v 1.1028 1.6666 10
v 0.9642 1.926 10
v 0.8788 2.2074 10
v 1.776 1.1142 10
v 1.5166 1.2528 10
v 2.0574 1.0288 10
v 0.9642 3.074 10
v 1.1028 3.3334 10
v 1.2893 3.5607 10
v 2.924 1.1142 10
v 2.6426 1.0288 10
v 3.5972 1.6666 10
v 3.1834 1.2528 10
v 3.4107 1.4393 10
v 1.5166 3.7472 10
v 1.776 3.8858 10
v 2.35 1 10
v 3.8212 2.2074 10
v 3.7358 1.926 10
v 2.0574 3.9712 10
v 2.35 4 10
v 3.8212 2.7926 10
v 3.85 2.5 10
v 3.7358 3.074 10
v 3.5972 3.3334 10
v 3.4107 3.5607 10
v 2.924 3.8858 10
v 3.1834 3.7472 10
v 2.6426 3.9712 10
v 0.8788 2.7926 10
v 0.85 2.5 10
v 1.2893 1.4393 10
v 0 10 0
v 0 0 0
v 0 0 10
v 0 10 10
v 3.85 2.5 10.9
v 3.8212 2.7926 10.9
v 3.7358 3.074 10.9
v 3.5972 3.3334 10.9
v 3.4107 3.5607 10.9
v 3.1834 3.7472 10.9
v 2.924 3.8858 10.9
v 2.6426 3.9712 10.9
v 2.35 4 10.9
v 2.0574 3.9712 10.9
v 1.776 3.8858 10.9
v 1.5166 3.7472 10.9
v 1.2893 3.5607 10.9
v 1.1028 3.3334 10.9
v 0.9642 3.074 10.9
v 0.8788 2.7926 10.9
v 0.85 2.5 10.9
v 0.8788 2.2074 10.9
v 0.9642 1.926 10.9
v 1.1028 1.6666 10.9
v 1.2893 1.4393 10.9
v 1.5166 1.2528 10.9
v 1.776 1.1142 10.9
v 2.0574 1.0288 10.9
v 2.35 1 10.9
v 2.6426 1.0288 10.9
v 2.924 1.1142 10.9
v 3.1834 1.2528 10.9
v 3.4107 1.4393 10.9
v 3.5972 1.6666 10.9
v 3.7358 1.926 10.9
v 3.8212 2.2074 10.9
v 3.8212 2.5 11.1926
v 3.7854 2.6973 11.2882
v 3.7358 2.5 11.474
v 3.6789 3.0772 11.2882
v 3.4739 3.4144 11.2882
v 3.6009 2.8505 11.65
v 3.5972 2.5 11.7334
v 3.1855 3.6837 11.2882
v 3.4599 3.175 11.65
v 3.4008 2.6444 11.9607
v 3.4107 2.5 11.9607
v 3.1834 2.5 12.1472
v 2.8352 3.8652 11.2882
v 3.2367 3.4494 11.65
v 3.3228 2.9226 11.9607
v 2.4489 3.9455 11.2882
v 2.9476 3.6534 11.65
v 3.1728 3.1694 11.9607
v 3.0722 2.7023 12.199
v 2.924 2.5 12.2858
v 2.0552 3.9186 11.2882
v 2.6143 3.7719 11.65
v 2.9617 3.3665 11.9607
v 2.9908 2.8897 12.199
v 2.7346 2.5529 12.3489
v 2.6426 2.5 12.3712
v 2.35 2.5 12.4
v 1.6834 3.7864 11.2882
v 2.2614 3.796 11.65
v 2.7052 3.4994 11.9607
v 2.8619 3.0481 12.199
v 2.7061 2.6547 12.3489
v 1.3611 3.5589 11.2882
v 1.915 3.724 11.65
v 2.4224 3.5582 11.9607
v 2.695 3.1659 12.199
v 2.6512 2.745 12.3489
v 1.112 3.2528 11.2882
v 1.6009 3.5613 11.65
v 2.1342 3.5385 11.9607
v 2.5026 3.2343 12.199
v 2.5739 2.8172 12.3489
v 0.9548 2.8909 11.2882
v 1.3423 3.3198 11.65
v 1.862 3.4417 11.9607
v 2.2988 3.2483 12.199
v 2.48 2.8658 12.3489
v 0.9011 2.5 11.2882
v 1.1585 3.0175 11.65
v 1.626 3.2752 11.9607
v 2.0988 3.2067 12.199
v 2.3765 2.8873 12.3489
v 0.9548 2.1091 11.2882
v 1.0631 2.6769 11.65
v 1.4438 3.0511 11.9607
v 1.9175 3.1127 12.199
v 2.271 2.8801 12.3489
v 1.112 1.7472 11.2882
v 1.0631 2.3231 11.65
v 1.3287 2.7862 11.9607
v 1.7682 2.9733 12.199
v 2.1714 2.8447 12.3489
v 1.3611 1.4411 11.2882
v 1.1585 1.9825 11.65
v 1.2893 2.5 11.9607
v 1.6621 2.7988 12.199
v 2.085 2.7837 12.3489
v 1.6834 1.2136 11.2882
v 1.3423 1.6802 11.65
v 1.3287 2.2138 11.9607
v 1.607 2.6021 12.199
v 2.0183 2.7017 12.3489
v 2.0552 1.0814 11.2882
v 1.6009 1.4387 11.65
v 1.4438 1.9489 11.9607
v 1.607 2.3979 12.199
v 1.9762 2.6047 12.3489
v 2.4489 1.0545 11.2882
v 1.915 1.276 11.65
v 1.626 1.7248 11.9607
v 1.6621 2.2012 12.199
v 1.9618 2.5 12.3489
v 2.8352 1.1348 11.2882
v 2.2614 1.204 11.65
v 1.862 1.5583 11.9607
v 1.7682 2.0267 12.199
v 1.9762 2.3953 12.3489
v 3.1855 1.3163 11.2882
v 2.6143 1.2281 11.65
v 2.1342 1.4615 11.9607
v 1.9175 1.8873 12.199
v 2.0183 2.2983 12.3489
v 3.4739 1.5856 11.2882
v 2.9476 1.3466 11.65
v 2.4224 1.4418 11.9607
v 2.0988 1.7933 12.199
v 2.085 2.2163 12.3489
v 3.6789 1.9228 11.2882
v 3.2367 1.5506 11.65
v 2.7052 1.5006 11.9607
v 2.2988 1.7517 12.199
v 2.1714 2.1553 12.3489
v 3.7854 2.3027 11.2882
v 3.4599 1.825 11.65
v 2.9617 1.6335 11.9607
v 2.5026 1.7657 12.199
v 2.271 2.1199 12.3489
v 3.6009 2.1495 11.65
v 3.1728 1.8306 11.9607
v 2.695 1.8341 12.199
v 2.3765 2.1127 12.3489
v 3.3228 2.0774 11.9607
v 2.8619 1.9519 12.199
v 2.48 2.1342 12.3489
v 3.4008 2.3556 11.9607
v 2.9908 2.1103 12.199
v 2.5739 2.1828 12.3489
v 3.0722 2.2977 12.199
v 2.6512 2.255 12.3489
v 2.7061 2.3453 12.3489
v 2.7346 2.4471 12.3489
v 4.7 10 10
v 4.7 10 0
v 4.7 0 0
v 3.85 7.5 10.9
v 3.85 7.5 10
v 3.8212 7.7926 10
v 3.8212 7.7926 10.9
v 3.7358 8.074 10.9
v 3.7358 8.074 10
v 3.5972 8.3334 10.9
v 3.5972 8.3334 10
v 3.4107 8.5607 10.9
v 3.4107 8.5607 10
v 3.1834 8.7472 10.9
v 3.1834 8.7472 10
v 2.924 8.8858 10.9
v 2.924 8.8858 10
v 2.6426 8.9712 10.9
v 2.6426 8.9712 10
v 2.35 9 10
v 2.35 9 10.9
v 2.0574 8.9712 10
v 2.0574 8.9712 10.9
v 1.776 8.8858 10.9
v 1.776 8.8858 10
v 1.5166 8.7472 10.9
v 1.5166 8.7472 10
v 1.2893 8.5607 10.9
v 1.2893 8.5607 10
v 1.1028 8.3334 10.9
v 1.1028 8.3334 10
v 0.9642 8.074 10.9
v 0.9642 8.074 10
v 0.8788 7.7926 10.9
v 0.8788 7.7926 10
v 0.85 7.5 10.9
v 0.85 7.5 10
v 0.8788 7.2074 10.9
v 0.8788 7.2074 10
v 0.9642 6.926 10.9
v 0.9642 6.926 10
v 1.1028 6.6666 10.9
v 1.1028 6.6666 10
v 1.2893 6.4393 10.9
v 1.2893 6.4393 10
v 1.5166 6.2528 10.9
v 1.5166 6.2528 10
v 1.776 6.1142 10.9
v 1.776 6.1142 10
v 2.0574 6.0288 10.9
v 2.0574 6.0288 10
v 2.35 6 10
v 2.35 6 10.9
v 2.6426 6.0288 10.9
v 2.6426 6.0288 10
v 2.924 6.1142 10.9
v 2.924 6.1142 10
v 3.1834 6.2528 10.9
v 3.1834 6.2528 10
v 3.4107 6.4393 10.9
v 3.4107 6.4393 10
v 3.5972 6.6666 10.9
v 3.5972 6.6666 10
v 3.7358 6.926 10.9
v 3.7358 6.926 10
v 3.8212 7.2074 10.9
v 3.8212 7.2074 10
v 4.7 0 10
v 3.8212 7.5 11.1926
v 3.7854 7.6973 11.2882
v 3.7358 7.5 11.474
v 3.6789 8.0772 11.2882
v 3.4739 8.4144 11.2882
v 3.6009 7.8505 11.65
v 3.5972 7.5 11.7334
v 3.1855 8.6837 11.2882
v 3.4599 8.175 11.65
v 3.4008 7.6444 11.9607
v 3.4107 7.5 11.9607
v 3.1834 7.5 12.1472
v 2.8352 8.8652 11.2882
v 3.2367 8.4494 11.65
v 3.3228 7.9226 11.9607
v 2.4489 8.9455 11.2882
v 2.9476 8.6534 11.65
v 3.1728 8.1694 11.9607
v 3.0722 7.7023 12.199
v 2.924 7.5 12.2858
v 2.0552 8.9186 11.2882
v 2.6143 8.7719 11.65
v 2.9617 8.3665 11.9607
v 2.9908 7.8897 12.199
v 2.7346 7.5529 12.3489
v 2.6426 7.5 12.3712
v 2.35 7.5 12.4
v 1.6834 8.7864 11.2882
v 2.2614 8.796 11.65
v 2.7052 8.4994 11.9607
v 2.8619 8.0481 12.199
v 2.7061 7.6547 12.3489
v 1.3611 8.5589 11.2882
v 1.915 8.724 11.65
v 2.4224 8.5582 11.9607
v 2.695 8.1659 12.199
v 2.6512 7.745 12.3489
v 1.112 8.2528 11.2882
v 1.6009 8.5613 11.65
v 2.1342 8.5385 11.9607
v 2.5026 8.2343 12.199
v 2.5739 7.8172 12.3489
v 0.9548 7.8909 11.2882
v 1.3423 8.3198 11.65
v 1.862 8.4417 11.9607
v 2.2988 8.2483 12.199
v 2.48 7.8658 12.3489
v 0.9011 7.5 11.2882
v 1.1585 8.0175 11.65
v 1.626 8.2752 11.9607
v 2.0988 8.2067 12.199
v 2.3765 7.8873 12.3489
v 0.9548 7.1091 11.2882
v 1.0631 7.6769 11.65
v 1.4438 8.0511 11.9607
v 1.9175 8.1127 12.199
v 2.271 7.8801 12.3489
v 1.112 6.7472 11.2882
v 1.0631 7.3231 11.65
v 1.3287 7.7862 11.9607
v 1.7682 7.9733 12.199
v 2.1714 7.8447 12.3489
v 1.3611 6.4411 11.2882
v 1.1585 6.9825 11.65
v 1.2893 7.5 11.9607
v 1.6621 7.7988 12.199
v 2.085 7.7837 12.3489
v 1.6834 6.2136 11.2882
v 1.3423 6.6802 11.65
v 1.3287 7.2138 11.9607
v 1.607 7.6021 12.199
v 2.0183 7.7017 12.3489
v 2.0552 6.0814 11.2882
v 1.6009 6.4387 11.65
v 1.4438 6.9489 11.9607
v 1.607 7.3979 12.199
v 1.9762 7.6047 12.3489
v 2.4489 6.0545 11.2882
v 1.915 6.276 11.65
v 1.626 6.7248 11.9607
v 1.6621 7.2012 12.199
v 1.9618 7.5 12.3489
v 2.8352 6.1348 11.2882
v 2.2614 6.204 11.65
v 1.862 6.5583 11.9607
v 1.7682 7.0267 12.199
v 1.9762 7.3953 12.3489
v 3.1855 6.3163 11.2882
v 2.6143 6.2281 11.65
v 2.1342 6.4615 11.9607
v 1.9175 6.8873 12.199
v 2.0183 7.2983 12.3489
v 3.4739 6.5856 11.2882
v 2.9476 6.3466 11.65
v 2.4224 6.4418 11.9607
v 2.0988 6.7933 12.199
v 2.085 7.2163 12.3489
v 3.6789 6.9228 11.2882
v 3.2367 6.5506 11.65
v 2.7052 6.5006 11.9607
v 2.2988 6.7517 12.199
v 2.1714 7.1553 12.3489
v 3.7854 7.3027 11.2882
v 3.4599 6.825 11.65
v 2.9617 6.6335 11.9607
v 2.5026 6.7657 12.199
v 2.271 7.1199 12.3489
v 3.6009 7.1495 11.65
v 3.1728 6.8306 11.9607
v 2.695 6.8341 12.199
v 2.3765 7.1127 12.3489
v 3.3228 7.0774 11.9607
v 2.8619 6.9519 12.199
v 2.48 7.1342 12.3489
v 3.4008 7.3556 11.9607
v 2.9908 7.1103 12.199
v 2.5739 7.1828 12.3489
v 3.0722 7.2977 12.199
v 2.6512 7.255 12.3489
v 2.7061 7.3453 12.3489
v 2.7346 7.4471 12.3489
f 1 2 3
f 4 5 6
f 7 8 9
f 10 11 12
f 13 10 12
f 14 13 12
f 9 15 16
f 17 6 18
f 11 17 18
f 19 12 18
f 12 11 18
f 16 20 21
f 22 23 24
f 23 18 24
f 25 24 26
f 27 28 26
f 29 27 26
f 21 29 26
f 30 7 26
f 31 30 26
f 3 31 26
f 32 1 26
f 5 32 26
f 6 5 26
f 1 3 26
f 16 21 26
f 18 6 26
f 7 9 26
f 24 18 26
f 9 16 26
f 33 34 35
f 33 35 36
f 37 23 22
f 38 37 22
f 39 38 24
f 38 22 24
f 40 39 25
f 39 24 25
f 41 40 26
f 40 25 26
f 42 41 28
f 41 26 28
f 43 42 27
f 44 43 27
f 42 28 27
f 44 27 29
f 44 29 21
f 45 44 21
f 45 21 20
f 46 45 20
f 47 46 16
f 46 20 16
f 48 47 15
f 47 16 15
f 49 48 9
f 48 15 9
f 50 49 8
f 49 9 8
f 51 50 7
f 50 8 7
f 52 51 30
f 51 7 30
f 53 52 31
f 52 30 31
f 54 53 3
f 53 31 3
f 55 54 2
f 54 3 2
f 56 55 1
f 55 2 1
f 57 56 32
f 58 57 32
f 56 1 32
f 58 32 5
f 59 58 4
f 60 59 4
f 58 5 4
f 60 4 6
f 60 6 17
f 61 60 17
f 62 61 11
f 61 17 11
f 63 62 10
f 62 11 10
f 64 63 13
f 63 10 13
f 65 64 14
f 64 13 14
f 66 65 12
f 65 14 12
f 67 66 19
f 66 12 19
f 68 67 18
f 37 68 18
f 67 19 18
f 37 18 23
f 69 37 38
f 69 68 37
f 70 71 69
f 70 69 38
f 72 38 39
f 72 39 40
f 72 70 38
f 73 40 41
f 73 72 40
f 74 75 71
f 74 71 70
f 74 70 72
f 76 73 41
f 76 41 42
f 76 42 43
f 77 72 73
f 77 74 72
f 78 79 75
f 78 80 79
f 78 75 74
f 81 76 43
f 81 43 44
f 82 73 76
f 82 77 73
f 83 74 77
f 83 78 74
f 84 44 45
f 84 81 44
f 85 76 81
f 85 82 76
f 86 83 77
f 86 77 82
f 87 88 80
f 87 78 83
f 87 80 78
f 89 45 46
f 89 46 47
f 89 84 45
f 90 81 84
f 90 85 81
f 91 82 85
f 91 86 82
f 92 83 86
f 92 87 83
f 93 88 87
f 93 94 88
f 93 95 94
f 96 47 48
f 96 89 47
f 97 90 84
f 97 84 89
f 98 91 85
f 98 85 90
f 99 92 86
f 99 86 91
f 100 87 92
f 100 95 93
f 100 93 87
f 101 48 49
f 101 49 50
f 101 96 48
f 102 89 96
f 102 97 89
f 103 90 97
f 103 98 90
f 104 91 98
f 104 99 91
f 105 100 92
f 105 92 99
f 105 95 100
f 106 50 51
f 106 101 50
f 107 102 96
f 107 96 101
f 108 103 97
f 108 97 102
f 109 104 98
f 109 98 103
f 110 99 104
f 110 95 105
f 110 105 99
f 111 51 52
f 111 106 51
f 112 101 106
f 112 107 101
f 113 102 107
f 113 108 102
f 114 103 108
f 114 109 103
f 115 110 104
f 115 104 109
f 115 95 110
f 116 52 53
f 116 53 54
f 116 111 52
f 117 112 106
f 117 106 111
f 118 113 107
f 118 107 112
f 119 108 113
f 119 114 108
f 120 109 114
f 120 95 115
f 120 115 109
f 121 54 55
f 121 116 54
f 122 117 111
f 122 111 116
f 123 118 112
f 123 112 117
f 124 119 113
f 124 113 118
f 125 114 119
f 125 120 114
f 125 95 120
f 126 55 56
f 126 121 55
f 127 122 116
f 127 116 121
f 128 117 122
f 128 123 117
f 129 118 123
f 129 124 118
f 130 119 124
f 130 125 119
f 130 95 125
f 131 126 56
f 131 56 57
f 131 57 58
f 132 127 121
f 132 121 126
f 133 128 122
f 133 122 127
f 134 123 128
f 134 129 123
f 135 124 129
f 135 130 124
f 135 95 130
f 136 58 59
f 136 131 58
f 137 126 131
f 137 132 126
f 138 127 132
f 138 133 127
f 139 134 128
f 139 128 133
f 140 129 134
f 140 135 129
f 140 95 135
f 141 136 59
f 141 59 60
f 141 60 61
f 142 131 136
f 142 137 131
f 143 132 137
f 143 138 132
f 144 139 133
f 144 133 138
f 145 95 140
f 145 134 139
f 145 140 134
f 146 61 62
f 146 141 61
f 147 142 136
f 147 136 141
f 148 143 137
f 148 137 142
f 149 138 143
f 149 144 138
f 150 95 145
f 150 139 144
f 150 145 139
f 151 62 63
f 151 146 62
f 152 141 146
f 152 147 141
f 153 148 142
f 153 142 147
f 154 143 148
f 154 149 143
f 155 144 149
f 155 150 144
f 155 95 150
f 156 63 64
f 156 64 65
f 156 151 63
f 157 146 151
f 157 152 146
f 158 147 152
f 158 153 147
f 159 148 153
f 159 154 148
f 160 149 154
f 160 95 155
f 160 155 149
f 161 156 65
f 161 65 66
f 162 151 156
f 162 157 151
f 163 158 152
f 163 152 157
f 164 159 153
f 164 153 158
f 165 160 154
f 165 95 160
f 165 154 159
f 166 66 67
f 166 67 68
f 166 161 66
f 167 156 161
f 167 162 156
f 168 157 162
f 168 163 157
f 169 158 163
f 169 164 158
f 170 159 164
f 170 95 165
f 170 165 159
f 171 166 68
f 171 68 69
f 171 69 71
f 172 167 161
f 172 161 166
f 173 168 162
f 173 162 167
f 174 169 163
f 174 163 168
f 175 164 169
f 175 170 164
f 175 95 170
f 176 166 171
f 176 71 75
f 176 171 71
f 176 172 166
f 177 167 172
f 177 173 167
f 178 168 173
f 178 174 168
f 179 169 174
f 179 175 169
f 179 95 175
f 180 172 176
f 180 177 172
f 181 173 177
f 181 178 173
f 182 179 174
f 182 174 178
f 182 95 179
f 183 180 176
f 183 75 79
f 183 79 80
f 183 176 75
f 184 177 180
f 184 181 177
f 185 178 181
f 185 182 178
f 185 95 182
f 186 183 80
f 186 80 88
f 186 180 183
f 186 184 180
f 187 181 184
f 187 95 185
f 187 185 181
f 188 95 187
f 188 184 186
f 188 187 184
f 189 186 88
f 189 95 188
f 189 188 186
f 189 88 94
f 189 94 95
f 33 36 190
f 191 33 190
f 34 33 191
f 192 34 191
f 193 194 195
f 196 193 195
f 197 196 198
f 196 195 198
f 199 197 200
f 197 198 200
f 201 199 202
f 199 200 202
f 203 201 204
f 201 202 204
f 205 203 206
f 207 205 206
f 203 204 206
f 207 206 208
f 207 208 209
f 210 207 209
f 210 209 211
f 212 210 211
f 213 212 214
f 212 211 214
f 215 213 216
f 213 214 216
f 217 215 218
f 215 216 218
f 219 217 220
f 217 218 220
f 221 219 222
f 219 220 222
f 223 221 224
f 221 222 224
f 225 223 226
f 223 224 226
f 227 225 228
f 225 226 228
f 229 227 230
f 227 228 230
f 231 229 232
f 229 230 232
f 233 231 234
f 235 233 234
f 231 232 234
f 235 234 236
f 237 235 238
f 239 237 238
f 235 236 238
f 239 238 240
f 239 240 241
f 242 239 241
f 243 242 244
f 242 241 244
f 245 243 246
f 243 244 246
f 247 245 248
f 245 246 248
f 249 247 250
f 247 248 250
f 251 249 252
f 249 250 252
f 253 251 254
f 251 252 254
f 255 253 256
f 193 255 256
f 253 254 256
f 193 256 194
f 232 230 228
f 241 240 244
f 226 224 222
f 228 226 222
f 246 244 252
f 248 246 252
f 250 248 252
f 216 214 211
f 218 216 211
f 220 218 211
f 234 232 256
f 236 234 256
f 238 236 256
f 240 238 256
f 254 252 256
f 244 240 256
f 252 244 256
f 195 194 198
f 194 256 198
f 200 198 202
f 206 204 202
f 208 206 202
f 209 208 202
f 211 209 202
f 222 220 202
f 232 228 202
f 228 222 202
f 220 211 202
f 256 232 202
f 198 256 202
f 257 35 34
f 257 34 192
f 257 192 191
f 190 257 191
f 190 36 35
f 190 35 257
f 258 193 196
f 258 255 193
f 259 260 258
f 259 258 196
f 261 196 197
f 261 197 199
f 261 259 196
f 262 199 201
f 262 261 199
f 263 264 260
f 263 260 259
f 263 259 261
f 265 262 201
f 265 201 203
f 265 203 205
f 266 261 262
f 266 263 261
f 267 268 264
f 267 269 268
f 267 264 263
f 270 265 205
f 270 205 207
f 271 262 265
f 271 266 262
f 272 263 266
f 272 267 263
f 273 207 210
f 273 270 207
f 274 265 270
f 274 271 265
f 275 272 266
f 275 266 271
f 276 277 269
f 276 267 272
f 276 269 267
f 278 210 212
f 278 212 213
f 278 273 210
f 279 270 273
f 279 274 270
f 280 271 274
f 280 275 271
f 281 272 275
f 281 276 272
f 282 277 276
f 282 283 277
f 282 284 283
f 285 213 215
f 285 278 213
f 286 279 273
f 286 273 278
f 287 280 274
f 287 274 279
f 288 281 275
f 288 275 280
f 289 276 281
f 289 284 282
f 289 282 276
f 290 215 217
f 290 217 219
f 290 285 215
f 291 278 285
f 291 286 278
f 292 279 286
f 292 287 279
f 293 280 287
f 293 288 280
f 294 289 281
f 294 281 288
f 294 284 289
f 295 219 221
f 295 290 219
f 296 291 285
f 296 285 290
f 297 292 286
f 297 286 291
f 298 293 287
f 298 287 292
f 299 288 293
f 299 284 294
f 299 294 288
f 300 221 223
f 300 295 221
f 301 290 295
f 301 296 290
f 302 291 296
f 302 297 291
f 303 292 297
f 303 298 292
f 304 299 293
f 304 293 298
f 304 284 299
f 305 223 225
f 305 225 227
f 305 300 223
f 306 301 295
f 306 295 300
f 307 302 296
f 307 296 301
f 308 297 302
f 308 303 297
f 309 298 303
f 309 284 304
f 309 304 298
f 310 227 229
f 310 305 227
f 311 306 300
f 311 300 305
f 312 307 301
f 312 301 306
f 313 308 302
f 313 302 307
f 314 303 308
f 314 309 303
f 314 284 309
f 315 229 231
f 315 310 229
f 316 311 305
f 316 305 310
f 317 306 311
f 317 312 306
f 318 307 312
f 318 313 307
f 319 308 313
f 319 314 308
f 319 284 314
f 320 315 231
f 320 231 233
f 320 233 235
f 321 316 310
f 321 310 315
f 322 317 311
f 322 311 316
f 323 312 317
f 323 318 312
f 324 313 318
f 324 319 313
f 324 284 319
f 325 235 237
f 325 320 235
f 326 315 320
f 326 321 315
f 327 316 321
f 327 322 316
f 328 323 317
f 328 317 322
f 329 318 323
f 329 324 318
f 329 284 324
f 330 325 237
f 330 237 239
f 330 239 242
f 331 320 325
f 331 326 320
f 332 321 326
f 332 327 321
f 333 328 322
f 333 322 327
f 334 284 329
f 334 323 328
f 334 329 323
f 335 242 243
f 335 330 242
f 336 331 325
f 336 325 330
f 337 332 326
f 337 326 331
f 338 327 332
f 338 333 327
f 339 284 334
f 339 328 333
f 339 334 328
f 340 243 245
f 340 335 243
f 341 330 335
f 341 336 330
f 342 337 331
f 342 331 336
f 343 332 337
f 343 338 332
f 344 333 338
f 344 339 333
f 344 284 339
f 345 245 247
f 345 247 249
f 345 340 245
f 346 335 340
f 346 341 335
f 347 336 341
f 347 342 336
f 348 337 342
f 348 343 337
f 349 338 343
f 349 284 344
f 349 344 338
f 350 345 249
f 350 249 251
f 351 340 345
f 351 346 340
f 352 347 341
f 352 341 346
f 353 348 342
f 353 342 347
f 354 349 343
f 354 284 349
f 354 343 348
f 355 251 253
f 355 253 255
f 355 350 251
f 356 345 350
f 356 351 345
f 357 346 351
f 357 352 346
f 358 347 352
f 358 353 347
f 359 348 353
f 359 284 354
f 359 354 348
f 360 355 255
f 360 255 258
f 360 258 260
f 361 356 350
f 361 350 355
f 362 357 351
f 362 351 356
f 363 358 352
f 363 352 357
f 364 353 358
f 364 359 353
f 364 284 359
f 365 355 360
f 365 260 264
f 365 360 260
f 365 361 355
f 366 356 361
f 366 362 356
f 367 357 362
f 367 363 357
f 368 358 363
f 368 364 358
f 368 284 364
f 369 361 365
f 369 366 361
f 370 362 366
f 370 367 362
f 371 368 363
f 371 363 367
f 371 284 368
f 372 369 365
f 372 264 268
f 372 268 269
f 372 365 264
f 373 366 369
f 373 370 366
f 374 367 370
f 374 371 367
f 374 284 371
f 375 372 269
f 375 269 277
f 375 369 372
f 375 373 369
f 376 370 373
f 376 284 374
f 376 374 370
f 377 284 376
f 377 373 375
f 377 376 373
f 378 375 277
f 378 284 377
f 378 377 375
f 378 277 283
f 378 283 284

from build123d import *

# Parameters (mm, degrees)
CROQUIS1_W       = 4.7
CROQUIS1_H       = 10
EXTRUIR1_DEPTH   = 10
CROQUIS2_R       = 1.5
EXTRUIR2_DEPTH   = 2.4
EXTRUIR2_2_DEPTH = 2.4
REDONDEO1_R      = 1.5
REDONDEO2_R      = 1.5


with BuildPart() as part:
    # Croquis1 → Extruir1 (new body)
    with BuildSketch(Plane.XY):
        with Locations((2.35, 5)):
            Rectangle(CROQUIS1_W, CROQUIS1_H)
    extrude(amount=EXTRUIR1_DEPTH)


with BuildPart() as body_2:
    # Croquis2 → Extruir2 (new body)
    with BuildSketch(Plane.XY.offset(10)):
        with Locations((2.35, 7.5)):
            Circle(CROQUIS2_R)
    extrude(amount=EXTRUIR2_DEPTH)

    # Redondeo1
    redondeo1_edges = [body_2.edges().sort_by_distance(p)[0] for p in [
        (0.85, 7.5, 12.4),
    ]]
    fillet(redondeo1_edges, radius=REDONDEO1_R)


with BuildPart() as body_3:
    # Croquis2 → Extruir2 2 (new body)
    with BuildSketch(Plane.XY.offset(10)):
        with Locations((2.35, 2.5)):
            Circle(CROQUIS2_R)
    extrude(amount=EXTRUIR2_2_DEPTH)

    # Redondeo2
    redondeo2_edges = [body_3.edges().sort_by_distance(p)[0] for p in [
        (0.85, 2.5, 12.4),
    ]]
    fillet(redondeo2_edges, radius=REDONDEO2_R)


solid = Compound([part.part, body_2.part, body_3.part])
